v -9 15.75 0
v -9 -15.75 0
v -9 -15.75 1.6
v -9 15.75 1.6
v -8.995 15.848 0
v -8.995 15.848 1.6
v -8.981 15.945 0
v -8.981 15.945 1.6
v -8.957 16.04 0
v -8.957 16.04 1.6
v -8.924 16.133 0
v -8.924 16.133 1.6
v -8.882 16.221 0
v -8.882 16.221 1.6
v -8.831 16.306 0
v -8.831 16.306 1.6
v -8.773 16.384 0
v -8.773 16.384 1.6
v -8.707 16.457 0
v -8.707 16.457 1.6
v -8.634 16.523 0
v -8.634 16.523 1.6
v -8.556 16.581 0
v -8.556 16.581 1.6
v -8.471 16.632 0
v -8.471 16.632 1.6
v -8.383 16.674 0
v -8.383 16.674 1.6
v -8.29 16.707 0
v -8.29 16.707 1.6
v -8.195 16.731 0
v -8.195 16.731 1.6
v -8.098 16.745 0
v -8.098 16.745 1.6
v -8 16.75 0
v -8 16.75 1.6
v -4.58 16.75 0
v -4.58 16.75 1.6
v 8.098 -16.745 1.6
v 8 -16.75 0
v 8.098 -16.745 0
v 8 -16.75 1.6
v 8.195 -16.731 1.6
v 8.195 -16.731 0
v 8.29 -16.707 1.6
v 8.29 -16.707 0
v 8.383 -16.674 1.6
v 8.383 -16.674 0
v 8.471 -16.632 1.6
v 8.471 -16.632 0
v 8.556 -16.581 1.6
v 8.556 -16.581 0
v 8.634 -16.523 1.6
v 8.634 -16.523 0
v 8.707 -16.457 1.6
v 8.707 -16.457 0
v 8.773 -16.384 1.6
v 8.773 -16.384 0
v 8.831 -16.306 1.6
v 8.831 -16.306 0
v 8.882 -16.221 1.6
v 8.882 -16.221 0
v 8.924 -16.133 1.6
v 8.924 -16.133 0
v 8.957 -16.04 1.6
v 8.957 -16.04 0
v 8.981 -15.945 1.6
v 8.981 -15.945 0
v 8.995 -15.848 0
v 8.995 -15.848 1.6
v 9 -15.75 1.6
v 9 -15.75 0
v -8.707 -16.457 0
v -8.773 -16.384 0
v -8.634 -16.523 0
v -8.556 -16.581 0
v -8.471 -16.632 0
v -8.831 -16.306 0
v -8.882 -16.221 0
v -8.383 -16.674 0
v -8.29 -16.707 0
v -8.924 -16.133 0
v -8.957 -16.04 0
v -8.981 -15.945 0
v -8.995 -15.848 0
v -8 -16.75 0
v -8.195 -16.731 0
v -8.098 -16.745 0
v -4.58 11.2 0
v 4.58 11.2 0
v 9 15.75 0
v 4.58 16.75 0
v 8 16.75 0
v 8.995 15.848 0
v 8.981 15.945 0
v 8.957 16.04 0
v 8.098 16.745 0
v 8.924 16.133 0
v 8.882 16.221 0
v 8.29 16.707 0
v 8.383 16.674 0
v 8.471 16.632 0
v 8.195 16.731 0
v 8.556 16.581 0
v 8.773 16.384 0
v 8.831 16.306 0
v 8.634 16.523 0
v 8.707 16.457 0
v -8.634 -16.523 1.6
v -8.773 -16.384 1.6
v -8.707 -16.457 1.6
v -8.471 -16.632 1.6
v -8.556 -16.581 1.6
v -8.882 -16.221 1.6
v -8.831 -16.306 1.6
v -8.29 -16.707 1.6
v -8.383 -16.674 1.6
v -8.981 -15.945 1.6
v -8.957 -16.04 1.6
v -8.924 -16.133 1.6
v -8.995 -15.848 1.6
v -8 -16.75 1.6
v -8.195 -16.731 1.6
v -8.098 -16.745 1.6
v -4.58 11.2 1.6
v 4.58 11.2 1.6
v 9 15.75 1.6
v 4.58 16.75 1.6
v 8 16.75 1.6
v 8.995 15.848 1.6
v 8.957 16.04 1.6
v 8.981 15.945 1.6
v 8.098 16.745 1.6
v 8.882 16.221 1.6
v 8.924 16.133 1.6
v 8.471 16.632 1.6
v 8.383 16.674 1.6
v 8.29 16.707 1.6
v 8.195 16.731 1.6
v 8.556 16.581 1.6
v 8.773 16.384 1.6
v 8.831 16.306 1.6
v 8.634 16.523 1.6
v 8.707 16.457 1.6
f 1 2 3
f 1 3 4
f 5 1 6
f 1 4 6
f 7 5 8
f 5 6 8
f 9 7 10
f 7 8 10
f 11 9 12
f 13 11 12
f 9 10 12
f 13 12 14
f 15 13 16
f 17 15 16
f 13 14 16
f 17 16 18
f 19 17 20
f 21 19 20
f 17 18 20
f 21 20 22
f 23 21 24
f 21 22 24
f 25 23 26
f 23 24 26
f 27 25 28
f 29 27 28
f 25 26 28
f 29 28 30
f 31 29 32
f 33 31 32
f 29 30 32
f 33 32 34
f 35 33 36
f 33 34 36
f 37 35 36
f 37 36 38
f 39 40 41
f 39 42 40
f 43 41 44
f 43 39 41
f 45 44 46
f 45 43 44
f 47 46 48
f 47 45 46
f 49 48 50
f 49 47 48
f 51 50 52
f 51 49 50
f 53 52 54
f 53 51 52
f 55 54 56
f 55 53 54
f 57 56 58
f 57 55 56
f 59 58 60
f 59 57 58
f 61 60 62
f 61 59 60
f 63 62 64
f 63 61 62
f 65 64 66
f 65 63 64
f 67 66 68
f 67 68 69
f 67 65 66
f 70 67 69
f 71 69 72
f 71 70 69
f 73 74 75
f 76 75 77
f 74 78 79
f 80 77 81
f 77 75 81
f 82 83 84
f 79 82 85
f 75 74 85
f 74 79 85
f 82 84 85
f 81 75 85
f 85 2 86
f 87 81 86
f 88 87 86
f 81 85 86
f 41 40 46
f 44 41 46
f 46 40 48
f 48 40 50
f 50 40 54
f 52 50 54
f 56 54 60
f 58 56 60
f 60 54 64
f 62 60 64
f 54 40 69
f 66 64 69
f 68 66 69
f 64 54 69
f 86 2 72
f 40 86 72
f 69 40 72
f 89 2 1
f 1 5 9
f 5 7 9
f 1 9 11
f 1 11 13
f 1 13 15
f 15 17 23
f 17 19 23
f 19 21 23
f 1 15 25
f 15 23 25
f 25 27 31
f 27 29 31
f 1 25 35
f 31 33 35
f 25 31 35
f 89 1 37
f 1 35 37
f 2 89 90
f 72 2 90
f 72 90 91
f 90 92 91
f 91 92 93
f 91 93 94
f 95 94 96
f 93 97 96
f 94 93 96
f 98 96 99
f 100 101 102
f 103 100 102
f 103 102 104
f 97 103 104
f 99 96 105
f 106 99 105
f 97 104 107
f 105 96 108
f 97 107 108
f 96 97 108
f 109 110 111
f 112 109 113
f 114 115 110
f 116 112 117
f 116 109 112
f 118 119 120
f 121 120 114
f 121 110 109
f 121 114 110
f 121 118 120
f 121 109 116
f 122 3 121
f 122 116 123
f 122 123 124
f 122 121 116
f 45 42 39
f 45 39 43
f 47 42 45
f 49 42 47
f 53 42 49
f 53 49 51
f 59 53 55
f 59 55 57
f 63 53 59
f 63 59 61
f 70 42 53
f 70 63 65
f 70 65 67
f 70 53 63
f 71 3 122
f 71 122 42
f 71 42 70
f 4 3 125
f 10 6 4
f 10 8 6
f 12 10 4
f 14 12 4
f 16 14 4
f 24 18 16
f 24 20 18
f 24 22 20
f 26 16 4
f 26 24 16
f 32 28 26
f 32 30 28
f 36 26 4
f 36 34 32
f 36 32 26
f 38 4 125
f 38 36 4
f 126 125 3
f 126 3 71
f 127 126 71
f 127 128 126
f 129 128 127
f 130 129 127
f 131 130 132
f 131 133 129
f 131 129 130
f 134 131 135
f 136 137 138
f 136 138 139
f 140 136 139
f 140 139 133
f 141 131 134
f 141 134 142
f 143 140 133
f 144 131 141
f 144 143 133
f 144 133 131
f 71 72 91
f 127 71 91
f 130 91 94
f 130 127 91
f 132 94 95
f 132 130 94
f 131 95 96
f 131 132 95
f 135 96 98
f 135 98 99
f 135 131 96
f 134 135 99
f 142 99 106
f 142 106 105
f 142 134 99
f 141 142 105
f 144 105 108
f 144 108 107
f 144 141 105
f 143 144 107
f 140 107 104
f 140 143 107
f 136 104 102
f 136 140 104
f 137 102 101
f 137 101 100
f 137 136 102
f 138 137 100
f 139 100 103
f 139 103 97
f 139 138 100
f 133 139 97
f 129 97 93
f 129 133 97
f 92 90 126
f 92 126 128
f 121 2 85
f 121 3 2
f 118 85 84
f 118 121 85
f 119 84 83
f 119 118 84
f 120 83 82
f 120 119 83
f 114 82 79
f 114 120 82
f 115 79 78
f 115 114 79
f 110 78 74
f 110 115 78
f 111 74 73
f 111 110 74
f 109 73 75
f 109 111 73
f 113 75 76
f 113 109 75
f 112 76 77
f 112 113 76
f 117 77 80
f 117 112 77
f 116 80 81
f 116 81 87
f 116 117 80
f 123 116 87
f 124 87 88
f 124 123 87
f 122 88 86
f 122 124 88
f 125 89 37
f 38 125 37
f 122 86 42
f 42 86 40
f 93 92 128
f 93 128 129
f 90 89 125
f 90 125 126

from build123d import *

# Parameters (mm, degrees)
SKETCH_W     = 18
SKETCH_H     = 33.5
PAD_DEPTH    = 1.6
FILLET_R     = 1
SKETCH001_W  = 9.16
SKETCH001_H  = 6.5
POCKET_DEPTH = 5


with BuildPart() as part:
    # Sketch → Pad (new body)
    with BuildSketch(Plane.XY):
        Rectangle(SKETCH_W, SKETCH_H)
    extrude(amount=PAD_DEPTH)

    # Fillet
    fillet_edges = [part.edges().sort_by_distance(p)[0] for p in [
        (9, 16.75, 0.8),
        (9, -16.75, 0.8),
        (-9, -16.75, 0.8),
        (-9, 16.75, 0.8),
    ]]
    fillet(fillet_edges, radius=FILLET_R)

    # Sketch001 → Pocket (cut)
    with BuildSketch(Plane.XY):
        with Locations((0, 14.45)):
            Rectangle(SKETCH001_W, SKETCH001_H)
    extrude(amount=POCKET_DEPTH, mode=Mode.SUBTRACT)


solid = part.part
